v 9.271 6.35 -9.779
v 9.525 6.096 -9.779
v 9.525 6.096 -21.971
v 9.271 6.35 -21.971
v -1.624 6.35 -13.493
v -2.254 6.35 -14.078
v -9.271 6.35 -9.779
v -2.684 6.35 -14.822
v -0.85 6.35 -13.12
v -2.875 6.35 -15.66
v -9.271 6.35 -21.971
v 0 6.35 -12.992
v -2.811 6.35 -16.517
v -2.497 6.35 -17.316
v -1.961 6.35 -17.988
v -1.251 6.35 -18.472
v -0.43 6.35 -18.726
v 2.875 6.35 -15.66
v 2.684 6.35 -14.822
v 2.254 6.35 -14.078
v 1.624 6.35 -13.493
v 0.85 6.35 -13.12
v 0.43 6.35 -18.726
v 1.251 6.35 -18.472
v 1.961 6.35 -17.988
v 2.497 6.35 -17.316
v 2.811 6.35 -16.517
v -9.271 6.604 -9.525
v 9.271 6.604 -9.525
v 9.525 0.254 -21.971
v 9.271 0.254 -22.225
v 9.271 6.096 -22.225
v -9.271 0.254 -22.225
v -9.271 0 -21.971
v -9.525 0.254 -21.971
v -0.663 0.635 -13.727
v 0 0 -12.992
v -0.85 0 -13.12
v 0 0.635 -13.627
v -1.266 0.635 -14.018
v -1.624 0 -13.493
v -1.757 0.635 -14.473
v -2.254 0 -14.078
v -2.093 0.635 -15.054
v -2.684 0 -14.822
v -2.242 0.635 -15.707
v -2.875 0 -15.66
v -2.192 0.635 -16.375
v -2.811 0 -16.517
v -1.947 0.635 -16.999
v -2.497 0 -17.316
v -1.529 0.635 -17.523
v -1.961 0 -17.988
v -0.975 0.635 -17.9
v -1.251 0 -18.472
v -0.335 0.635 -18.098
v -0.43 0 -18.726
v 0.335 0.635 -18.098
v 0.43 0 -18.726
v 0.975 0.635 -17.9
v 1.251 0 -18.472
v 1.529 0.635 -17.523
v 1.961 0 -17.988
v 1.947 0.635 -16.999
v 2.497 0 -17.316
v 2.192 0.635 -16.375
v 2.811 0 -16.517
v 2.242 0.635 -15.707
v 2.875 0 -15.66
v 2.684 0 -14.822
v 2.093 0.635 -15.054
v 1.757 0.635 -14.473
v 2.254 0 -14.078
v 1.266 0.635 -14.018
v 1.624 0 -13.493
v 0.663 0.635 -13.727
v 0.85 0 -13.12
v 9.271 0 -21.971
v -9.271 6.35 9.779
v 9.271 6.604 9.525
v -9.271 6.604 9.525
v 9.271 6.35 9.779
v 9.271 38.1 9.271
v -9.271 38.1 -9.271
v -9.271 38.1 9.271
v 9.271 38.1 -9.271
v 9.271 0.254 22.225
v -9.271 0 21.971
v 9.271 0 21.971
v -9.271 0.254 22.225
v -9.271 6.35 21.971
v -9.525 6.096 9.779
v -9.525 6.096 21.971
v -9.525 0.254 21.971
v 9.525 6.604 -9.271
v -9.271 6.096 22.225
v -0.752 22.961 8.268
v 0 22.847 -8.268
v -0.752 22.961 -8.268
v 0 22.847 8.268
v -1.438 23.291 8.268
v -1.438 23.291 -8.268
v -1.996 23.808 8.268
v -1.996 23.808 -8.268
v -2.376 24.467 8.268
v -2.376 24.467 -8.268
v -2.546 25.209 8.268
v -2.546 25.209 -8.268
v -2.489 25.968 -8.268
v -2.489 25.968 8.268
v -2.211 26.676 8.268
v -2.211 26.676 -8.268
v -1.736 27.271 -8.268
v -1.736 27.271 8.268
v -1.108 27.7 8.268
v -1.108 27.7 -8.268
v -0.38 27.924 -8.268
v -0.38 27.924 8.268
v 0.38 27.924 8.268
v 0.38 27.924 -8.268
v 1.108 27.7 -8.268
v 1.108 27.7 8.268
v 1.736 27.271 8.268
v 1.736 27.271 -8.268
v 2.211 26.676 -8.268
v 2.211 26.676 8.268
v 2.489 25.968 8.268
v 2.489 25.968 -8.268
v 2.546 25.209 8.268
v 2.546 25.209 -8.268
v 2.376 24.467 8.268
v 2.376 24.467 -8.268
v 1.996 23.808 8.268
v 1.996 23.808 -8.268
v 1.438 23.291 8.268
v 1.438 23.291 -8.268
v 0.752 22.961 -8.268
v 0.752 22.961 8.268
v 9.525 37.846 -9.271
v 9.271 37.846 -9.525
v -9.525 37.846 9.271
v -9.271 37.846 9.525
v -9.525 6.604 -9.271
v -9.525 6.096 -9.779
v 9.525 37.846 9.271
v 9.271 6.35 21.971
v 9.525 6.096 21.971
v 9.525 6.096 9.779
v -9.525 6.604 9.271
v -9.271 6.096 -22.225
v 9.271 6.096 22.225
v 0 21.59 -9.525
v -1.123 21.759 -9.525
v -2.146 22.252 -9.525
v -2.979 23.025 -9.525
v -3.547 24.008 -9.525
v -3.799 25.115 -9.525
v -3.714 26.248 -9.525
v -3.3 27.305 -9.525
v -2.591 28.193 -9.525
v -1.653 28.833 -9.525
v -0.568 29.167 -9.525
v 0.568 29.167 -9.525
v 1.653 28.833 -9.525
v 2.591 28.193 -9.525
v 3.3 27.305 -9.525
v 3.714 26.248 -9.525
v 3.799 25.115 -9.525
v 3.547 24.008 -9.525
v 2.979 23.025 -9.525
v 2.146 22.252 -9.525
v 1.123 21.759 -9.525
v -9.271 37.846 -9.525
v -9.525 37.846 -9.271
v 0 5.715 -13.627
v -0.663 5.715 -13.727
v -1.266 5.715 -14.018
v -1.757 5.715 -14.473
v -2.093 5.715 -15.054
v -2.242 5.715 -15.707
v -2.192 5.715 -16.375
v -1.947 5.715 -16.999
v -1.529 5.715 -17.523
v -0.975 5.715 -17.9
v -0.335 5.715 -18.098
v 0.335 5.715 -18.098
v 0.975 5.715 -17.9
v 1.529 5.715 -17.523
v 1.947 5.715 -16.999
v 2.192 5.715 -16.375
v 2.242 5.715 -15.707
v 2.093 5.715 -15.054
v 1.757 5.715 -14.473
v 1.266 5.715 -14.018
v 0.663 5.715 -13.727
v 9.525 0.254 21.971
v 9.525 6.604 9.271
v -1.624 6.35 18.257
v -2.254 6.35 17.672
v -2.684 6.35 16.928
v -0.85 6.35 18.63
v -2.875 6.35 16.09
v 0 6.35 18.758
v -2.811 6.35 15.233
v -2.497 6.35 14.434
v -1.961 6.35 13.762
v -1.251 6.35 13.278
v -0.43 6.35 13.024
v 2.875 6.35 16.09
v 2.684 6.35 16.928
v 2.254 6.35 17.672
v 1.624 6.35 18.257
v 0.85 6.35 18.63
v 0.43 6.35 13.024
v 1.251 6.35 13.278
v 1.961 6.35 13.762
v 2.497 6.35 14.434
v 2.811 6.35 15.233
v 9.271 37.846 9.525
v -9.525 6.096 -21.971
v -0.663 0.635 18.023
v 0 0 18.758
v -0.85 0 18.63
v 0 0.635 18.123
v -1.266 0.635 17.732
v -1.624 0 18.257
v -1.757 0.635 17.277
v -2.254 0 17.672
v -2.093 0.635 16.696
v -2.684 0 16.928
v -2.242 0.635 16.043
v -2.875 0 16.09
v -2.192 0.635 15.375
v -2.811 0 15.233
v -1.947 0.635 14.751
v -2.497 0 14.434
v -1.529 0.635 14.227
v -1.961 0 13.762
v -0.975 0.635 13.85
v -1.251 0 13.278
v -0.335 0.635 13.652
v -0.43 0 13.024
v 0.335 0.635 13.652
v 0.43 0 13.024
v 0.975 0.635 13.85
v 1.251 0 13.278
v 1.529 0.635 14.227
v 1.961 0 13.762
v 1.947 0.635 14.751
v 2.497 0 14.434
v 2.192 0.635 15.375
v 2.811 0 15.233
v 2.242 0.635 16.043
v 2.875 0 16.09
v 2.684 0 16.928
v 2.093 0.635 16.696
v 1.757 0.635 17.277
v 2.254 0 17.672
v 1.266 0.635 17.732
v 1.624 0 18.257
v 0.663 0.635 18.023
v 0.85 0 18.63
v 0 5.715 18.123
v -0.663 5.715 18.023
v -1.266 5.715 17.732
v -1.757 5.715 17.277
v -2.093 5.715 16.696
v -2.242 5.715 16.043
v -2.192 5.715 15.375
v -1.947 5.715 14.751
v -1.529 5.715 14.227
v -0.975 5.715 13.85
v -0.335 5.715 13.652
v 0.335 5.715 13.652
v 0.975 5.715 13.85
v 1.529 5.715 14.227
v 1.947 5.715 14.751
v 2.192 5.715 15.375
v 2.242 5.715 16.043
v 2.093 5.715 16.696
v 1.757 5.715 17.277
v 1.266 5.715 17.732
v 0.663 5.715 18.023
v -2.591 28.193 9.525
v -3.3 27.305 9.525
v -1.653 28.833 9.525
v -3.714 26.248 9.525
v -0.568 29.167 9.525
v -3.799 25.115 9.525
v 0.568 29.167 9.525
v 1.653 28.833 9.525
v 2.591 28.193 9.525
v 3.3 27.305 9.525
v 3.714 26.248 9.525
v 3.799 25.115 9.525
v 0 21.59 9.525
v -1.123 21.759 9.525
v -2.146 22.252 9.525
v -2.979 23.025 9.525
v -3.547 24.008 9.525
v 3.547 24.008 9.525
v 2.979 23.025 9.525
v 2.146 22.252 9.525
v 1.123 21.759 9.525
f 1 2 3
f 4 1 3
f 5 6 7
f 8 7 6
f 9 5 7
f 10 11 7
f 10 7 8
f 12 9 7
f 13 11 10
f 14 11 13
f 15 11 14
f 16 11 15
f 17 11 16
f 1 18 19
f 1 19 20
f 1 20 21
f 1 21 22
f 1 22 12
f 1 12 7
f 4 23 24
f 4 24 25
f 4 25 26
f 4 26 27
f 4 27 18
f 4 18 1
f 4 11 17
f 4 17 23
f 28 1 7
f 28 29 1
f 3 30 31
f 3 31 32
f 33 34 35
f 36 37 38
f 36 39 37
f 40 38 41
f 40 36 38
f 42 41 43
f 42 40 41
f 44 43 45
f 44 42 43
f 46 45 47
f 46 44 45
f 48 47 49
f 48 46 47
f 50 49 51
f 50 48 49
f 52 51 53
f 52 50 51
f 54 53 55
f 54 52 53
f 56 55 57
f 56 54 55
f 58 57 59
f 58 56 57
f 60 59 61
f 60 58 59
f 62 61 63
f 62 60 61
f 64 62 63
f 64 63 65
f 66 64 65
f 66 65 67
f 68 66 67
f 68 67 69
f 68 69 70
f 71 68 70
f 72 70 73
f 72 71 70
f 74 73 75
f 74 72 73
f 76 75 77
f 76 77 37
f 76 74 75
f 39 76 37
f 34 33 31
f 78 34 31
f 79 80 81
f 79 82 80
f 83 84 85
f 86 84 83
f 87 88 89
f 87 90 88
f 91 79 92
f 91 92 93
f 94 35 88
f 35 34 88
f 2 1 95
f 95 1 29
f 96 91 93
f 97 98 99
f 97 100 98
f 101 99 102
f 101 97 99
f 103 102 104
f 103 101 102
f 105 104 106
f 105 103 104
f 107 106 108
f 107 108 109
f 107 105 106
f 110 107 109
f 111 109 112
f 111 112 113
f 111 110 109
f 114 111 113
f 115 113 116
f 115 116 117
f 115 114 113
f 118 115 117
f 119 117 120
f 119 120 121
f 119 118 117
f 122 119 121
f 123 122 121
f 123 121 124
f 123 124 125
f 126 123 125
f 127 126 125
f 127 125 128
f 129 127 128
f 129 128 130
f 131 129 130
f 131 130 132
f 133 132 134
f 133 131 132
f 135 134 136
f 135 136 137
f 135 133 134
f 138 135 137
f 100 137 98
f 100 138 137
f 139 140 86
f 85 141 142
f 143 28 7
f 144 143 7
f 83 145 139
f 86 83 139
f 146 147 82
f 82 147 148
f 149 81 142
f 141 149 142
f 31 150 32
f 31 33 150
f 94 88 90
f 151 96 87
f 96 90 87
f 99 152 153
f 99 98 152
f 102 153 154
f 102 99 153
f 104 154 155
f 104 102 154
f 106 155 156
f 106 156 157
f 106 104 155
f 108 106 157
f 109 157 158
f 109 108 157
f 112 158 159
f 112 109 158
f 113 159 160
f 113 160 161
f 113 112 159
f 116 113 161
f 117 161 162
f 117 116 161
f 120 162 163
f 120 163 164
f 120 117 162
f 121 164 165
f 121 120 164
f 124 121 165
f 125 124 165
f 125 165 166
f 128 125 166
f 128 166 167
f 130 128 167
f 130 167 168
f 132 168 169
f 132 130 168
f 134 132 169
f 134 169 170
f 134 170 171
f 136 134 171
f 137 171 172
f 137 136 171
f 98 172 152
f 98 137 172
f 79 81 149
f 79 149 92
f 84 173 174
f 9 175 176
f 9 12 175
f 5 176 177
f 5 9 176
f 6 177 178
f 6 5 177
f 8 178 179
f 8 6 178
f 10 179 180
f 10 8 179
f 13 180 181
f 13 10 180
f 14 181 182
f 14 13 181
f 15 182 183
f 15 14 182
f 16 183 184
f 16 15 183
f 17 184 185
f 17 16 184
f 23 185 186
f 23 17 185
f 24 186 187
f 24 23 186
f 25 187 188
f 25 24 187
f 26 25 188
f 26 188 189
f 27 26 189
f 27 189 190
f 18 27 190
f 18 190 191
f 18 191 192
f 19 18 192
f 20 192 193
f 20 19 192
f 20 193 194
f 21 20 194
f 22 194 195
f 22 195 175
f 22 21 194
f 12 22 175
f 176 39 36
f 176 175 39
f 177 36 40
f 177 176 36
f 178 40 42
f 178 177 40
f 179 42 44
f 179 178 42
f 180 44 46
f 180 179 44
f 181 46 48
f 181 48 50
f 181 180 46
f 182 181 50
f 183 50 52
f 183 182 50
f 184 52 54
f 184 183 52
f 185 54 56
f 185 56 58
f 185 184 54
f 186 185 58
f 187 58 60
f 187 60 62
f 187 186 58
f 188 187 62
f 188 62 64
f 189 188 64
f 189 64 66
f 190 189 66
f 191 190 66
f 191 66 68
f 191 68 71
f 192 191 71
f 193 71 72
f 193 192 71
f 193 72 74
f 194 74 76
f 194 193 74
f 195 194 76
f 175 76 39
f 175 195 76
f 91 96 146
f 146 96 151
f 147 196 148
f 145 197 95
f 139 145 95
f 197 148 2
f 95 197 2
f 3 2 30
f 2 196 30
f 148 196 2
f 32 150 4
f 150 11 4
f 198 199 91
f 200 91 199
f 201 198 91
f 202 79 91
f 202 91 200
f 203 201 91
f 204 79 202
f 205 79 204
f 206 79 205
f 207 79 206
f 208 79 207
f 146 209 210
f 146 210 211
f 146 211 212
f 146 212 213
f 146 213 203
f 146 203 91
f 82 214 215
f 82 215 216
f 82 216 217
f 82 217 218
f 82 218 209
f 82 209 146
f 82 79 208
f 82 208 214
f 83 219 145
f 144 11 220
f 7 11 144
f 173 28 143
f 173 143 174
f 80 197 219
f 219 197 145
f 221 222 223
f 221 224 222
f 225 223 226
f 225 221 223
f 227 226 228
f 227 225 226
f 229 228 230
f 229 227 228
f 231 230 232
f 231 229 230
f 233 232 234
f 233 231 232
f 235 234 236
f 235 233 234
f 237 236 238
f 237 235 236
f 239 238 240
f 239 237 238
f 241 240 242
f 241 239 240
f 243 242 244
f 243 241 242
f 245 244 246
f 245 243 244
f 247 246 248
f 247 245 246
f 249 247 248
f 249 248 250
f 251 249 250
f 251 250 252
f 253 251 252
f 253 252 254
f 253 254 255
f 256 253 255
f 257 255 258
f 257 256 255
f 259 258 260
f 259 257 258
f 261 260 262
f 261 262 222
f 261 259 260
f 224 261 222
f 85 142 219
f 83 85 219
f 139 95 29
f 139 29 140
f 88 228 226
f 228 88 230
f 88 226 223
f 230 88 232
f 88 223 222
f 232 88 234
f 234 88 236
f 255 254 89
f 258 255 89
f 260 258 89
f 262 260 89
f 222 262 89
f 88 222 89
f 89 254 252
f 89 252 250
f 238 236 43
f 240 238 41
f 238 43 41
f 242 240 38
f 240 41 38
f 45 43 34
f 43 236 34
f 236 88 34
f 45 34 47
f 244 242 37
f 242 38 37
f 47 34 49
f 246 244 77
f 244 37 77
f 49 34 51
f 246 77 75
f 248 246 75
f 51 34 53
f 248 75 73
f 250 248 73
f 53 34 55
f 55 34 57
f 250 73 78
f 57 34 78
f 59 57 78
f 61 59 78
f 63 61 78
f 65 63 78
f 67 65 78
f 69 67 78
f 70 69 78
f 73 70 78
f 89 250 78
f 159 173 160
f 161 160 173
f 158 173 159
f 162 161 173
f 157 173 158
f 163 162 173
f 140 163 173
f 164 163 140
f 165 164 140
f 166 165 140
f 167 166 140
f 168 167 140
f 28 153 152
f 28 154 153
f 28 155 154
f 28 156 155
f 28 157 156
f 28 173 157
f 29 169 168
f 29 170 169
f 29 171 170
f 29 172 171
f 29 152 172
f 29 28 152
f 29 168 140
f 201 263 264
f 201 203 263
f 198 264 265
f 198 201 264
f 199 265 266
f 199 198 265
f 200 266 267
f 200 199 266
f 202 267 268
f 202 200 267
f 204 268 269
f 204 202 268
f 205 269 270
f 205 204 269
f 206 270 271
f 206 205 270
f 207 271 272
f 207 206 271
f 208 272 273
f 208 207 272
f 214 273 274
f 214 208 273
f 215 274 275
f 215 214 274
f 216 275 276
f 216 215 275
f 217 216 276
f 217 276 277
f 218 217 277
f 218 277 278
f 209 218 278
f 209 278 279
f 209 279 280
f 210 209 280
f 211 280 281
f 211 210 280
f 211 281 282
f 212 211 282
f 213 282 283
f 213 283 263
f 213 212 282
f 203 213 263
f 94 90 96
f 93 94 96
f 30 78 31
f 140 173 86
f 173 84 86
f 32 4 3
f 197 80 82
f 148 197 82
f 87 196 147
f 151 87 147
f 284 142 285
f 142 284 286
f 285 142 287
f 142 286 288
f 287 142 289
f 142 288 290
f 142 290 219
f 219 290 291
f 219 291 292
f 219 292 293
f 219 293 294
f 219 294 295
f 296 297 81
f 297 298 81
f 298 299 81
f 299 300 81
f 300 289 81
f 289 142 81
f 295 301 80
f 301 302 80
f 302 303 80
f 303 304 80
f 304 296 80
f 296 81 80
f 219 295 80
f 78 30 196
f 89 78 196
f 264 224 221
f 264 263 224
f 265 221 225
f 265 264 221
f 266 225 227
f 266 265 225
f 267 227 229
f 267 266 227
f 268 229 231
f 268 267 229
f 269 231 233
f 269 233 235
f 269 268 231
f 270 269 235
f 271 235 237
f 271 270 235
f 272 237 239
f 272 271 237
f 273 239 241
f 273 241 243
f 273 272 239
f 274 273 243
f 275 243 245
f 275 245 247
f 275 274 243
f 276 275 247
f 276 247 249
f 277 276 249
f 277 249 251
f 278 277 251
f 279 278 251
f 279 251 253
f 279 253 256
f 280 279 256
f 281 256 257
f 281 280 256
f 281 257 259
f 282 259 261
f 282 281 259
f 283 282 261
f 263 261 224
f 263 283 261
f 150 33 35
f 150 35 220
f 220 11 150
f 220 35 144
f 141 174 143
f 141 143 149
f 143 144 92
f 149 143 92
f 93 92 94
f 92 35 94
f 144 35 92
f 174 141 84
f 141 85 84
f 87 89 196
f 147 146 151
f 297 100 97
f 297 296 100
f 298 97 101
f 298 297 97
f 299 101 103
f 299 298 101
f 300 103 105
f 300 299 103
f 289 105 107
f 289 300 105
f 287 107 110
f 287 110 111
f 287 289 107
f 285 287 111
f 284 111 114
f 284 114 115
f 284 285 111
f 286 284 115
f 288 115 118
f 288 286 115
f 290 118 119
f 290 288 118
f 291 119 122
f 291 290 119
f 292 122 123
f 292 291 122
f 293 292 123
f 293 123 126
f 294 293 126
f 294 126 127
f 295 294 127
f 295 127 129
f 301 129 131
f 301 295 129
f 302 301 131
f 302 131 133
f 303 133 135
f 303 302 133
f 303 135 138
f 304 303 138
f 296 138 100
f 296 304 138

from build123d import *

# Parameters (mm, degrees)
SKETCH1_W                      = 19.05
SKETCH1_H                      = 44.45
SKETCH1_H_2                    = 19.05
BOSS_EXTRUDE1_DEPTH            = 6.35
SKETCH1_3_W                    = 19.05
SKETCH1_3_H                    = 19.05
BOSS_EXTRUDE2_DEPTH            = 38.1
F_8_CLEARANCE_HOLE1_AT_2_COUNT = 2
F_8_CLEARANCE_HOLE1_AT_2_PITCH = 31.75
CHAMFER1_SIZE                  = 0.254


with BuildPart() as part:
    # Sketch1 → Boss-Extrude1 (new body)
    with BuildSketch(Plane(origin=(0, 0, 0), x_dir=(1, 0, 0), z_dir=(0, 1, 0))):
        Rectangle(SKETCH1_W, SKETCH1_H)
        Rectangle(SKETCH1_W, SKETCH1_H_2)
    extrude(amount=BOSS_EXTRUDE1_DEPTH)

    # Sketch1<3> → Boss-Extrude2 (add)
    with BuildSketch(Plane(origin=(0, 0, 0), x_dir=(1, 0, 0), z_dir=(0, 1, 0))):
        Rectangle(SKETCH1_3_W, SKETCH1_3_H)
    extrude(amount=BOSS_EXTRUDE2_DEPTH)

    # Sketch4 → 1/4-20 Tapped Hole1 (revolve, cut)
    with BuildSketch(Plane(origin=(0, 25.4, 9.525), x_dir=(0, -1, 0), z_dir=(1, 0, 0))):
        Polygon((0, 0), (0, 19.05), (3.81, 19.05), (2.5527, 17.7927), (2.5527, 1.2573), (3.81, 0), align=None)
    revolve(axis=Axis((0, 25.4, 15.875), (0, 0, -1)), mode=Mode.SUBTRACT)

    # Sketch8 → #8 Clearance Hole1 (revolve, cut)
    with BuildSketch(Plane(origin=(0, 6.35, -15.875), x_dir=(0, 0, 1), z_dir=(1, 0, 0))):
        Polygon((0, 0), (0, 6.35), (2.8829, 6.35), (2.2479, 5.715), (2.2479, 0.635), (2.8829, 0), align=None)
    f_8_clearance_hole1 = revolve(axis=Axis((0, 12.7, -15.875), (0, -1, 0)), mode=Mode.SUBTRACT)

    # #8 Clearance Hole1 at 2: #8 Clearance Hole1 ×2
    with Locations(*[(0, 0, i * F_8_CLEARANCE_HOLE1_AT_2_PITCH) for i in range(1, F_8_CLEARANCE_HOLE1_AT_2_COUNT)]):
        add(f_8_clearance_hole1, mode=Mode.SUBTRACT)

    # Chamfer1
    chamfer1_edges = [part.edges().sort_by_distance(p)[0] for p in [
        (0, 6.35, -22.225),
        (-9.525, 6.35, 15.875),
        (9.525, 6.35, -15.875),
        (-9.525, 6.35, -15.875),
        (0, 6.35, 22.225),
        (0, 6.35, 9.525),
        (9.525, 22.225, -9.525),
        (0, 6.35, -9.525),
        (0, 38.1, -9.525),
        (-9.525, 22.225, -9.525),
        (-9.525, 38.1, 0),
        (-9.525, 22.225, 9.525),
        (9.525, 22.225, 9.525),
        (0, 38.1, 9.525),
        (9.525, 38.1, 0),
        (9.525, 6.35, 15.875),
        (0, 0, 22.225),
        (-9.525, 0, 0),
        (0, 0, -22.225),
        (9.525, 0, 0),
        (9.525, 3.175, 22.225),
        (-9.525, 3.175, 22.225),
        (-9.525, 3.175, -22.225),
        (9.525, 3.175, -22.225),
    ]]
    chamfer(chamfer1_edges, length=CHAMFER1_SIZE)


solid = part.part
